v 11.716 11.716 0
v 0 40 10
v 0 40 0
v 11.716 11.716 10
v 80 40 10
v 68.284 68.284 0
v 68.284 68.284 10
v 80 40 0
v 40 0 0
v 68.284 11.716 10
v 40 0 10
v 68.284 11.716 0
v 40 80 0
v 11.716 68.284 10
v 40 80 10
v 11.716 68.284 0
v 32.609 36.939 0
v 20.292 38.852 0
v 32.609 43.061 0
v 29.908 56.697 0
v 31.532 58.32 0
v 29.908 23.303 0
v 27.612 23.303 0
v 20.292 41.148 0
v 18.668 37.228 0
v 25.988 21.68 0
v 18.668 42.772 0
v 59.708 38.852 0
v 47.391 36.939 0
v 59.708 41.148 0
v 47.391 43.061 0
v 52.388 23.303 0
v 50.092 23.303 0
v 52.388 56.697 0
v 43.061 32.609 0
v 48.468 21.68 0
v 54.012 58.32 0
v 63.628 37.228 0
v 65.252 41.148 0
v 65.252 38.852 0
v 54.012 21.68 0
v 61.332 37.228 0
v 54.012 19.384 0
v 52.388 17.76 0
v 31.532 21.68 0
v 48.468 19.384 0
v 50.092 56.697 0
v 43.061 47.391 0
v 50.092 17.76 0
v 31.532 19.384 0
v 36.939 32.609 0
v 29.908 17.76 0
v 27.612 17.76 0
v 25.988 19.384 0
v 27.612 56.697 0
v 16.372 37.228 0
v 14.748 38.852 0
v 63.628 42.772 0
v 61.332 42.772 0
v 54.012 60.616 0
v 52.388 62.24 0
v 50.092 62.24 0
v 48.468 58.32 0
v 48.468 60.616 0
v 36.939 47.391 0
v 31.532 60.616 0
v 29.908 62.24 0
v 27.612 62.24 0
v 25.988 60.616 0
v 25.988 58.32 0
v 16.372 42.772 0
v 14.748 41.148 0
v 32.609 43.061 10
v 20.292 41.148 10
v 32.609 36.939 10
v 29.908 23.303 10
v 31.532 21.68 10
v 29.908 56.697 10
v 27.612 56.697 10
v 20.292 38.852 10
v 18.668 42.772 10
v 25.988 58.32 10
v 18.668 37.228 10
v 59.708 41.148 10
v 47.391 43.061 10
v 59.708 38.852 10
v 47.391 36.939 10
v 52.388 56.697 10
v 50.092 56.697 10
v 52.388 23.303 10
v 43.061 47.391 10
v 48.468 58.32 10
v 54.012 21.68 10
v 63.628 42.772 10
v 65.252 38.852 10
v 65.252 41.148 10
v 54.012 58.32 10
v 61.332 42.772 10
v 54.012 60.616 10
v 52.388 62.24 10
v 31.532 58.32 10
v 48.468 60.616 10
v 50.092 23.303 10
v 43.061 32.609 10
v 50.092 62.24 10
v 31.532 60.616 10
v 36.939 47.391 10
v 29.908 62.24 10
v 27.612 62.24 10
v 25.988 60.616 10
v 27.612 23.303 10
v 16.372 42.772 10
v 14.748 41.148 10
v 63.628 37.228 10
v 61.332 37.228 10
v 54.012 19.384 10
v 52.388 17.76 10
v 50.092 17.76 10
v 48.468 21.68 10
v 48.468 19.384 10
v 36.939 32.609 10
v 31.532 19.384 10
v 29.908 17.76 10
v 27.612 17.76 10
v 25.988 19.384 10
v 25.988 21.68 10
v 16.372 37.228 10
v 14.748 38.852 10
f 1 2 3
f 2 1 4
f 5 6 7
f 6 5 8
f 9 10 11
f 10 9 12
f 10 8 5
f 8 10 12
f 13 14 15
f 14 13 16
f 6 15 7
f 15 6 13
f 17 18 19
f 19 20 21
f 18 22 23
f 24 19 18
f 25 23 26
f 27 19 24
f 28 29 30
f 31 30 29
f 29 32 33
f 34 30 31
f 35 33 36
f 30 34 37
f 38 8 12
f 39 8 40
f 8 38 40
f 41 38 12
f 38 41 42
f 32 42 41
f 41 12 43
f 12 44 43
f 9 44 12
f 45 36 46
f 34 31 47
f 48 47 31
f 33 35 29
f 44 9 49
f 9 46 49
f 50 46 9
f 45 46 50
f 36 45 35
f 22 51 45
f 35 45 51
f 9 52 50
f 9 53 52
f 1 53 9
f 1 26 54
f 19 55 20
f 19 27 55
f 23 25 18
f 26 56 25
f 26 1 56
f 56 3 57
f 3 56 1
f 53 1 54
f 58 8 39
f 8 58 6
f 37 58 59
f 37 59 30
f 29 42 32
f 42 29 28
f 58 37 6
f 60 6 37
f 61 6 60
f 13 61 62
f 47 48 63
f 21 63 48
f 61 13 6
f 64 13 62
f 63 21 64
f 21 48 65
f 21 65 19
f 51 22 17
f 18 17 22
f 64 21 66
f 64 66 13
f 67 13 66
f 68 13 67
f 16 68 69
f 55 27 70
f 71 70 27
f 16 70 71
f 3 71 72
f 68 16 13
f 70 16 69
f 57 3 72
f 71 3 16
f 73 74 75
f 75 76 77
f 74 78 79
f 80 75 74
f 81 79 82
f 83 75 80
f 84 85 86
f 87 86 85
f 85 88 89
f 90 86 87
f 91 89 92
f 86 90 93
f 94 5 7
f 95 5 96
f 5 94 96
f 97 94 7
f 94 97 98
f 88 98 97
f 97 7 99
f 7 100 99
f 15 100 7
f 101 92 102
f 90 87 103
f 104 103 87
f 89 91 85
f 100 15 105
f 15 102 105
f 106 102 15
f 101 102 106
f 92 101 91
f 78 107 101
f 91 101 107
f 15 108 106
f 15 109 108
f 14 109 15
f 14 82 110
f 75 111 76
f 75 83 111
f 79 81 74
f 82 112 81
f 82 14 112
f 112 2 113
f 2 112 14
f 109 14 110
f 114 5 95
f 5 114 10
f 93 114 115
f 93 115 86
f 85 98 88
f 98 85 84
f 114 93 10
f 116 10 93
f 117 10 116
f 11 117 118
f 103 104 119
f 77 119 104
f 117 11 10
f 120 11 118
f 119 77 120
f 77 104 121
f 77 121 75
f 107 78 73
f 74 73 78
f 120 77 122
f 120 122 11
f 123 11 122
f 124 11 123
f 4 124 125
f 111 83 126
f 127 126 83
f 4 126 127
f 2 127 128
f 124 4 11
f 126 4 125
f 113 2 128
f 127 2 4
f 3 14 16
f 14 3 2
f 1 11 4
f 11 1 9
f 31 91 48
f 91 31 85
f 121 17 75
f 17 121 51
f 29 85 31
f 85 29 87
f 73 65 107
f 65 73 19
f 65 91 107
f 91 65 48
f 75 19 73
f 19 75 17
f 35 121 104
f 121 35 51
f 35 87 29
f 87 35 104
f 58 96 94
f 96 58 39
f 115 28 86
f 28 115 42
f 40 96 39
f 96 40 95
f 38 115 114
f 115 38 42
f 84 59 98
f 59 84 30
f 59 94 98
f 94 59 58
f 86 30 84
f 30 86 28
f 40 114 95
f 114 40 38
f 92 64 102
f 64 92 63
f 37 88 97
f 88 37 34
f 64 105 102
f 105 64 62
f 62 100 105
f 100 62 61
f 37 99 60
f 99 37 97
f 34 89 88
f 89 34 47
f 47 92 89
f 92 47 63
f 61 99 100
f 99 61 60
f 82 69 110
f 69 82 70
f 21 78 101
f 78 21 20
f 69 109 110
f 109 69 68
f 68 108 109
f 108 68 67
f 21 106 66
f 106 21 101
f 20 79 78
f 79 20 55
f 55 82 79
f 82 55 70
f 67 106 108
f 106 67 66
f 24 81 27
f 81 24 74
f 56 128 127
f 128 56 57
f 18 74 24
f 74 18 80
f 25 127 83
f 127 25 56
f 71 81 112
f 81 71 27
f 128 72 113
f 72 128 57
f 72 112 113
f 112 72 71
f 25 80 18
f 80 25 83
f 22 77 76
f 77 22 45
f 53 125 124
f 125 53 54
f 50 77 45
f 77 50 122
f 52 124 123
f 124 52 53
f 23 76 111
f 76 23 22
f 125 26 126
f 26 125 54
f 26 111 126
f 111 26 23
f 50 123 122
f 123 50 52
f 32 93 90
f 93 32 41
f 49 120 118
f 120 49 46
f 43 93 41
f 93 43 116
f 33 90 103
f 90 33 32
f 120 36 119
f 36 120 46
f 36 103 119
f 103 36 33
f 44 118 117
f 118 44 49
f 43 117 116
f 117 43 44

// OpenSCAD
$fn = 32;

// ----------------------------------------------------------------------
// Polygon plate: 8-gon R40, 6 bolt windows
// ----------------------------------------------------------------------

// --- parameters (mm) ---
sides = 8;                // number of polygon sides
plate_r = 40;             // circumscribed radius of the polygon
bore_r = 8;               // centre bore radius
bolts = 6;                // number of bolt windows
ring_r = 22.48;           // bolt-circle radius
bolt_r = 3;               // bolt window radius
plate_t = 10;             // plate thickness, Z (extrusion height)

plate_d = 2 * plate_r;  // circumscribed diameter
bore_d = 2 * bore_r;  // centre bore diameter
bolt_d = 2 * bolt_r;  // bolt window diameter
ring_d = 2 * ring_r;  // bolt-circle diameter

profile = [[80, 40], [68.284, 68.284], [40, 80], [11.716, 68.284], [0, 40], [11.716, 11.716], [40, 0], [68.284, 11.716]];  // primary outline, 8 points, counter clockwise
void_1 = [[47.391, 43.061], [43.061, 47.391], [36.939, 47.391], [32.609, 43.061], [32.609, 36.939], [36.939, 32.609], [43.061, 32.609], [47.391, 36.939]];  // centre bore, 8 points
void_2 = [[65.252, 41.148], [63.628, 42.772], [61.332, 42.772], [59.708, 41.148], [59.708, 38.852], [61.332, 37.228], [63.628, 37.228], [65.252, 38.852]];  // bolt window 1, 8 points
void_3 = [[54.012, 60.616], [52.388, 62.24], [50.092, 62.24], [48.468, 60.616], [48.468, 58.32], [50.092, 56.697], [52.388, 56.697], [54.012, 58.32]];  // bolt window 2, 8 points
void_4 = [[31.532, 60.616], [29.908, 62.24], [27.612, 62.24], [25.988, 60.616], [25.988, 58.32], [27.612, 56.697], [29.908, 56.697], [31.532, 58.32]];  // bolt window 3, 8 points
void_5 = [[20.292, 41.148], [18.668, 42.772], [16.372, 42.772], [14.748, 41.148], [14.748, 38.852], [16.372, 37.228], [18.668, 37.228], [20.292, 38.852]];  // bolt window 4, 8 points
void_6 = [[31.532, 21.68], [29.908, 23.303], [27.612, 23.303], [25.988, 21.68], [25.988, 19.384], [27.612, 17.76], [29.908, 17.76], [31.532, 19.384]];  // bolt window 5, 8 points
void_7 = [[54.012, 21.68], [52.388, 23.303], [50.092, 23.303], [48.468, 21.68], [48.468, 19.384], [50.092, 17.76], [52.388, 17.76], [54.012, 19.384]];  // bolt window 6, 8 points

// --- the one profile operation ---
difference() {
  linear_extrude(height = plate_t) polygon(points = profile);
  translate([0, 0, -1])
    linear_extrude(height = plate_t + 2) polygon(points = void_1);
  translate([0, 0, -1])
    linear_extrude(height = plate_t + 2) polygon(points = void_2);
  translate([0, 0, -1])
    linear_extrude(height = plate_t + 2) polygon(points = void_3);
  translate([0, 0, -1])
    linear_extrude(height = plate_t + 2) polygon(points = void_4);
  translate([0, 0, -1])
    linear_extrude(height = plate_t + 2) polygon(points = void_5);
  translate([0, 0, -1])
    linear_extrude(height = plate_t + 2) polygon(points = void_6);
  translate([0, 0, -1])
    linear_extrude(height = plate_t + 2) polygon(points = void_7);
}
